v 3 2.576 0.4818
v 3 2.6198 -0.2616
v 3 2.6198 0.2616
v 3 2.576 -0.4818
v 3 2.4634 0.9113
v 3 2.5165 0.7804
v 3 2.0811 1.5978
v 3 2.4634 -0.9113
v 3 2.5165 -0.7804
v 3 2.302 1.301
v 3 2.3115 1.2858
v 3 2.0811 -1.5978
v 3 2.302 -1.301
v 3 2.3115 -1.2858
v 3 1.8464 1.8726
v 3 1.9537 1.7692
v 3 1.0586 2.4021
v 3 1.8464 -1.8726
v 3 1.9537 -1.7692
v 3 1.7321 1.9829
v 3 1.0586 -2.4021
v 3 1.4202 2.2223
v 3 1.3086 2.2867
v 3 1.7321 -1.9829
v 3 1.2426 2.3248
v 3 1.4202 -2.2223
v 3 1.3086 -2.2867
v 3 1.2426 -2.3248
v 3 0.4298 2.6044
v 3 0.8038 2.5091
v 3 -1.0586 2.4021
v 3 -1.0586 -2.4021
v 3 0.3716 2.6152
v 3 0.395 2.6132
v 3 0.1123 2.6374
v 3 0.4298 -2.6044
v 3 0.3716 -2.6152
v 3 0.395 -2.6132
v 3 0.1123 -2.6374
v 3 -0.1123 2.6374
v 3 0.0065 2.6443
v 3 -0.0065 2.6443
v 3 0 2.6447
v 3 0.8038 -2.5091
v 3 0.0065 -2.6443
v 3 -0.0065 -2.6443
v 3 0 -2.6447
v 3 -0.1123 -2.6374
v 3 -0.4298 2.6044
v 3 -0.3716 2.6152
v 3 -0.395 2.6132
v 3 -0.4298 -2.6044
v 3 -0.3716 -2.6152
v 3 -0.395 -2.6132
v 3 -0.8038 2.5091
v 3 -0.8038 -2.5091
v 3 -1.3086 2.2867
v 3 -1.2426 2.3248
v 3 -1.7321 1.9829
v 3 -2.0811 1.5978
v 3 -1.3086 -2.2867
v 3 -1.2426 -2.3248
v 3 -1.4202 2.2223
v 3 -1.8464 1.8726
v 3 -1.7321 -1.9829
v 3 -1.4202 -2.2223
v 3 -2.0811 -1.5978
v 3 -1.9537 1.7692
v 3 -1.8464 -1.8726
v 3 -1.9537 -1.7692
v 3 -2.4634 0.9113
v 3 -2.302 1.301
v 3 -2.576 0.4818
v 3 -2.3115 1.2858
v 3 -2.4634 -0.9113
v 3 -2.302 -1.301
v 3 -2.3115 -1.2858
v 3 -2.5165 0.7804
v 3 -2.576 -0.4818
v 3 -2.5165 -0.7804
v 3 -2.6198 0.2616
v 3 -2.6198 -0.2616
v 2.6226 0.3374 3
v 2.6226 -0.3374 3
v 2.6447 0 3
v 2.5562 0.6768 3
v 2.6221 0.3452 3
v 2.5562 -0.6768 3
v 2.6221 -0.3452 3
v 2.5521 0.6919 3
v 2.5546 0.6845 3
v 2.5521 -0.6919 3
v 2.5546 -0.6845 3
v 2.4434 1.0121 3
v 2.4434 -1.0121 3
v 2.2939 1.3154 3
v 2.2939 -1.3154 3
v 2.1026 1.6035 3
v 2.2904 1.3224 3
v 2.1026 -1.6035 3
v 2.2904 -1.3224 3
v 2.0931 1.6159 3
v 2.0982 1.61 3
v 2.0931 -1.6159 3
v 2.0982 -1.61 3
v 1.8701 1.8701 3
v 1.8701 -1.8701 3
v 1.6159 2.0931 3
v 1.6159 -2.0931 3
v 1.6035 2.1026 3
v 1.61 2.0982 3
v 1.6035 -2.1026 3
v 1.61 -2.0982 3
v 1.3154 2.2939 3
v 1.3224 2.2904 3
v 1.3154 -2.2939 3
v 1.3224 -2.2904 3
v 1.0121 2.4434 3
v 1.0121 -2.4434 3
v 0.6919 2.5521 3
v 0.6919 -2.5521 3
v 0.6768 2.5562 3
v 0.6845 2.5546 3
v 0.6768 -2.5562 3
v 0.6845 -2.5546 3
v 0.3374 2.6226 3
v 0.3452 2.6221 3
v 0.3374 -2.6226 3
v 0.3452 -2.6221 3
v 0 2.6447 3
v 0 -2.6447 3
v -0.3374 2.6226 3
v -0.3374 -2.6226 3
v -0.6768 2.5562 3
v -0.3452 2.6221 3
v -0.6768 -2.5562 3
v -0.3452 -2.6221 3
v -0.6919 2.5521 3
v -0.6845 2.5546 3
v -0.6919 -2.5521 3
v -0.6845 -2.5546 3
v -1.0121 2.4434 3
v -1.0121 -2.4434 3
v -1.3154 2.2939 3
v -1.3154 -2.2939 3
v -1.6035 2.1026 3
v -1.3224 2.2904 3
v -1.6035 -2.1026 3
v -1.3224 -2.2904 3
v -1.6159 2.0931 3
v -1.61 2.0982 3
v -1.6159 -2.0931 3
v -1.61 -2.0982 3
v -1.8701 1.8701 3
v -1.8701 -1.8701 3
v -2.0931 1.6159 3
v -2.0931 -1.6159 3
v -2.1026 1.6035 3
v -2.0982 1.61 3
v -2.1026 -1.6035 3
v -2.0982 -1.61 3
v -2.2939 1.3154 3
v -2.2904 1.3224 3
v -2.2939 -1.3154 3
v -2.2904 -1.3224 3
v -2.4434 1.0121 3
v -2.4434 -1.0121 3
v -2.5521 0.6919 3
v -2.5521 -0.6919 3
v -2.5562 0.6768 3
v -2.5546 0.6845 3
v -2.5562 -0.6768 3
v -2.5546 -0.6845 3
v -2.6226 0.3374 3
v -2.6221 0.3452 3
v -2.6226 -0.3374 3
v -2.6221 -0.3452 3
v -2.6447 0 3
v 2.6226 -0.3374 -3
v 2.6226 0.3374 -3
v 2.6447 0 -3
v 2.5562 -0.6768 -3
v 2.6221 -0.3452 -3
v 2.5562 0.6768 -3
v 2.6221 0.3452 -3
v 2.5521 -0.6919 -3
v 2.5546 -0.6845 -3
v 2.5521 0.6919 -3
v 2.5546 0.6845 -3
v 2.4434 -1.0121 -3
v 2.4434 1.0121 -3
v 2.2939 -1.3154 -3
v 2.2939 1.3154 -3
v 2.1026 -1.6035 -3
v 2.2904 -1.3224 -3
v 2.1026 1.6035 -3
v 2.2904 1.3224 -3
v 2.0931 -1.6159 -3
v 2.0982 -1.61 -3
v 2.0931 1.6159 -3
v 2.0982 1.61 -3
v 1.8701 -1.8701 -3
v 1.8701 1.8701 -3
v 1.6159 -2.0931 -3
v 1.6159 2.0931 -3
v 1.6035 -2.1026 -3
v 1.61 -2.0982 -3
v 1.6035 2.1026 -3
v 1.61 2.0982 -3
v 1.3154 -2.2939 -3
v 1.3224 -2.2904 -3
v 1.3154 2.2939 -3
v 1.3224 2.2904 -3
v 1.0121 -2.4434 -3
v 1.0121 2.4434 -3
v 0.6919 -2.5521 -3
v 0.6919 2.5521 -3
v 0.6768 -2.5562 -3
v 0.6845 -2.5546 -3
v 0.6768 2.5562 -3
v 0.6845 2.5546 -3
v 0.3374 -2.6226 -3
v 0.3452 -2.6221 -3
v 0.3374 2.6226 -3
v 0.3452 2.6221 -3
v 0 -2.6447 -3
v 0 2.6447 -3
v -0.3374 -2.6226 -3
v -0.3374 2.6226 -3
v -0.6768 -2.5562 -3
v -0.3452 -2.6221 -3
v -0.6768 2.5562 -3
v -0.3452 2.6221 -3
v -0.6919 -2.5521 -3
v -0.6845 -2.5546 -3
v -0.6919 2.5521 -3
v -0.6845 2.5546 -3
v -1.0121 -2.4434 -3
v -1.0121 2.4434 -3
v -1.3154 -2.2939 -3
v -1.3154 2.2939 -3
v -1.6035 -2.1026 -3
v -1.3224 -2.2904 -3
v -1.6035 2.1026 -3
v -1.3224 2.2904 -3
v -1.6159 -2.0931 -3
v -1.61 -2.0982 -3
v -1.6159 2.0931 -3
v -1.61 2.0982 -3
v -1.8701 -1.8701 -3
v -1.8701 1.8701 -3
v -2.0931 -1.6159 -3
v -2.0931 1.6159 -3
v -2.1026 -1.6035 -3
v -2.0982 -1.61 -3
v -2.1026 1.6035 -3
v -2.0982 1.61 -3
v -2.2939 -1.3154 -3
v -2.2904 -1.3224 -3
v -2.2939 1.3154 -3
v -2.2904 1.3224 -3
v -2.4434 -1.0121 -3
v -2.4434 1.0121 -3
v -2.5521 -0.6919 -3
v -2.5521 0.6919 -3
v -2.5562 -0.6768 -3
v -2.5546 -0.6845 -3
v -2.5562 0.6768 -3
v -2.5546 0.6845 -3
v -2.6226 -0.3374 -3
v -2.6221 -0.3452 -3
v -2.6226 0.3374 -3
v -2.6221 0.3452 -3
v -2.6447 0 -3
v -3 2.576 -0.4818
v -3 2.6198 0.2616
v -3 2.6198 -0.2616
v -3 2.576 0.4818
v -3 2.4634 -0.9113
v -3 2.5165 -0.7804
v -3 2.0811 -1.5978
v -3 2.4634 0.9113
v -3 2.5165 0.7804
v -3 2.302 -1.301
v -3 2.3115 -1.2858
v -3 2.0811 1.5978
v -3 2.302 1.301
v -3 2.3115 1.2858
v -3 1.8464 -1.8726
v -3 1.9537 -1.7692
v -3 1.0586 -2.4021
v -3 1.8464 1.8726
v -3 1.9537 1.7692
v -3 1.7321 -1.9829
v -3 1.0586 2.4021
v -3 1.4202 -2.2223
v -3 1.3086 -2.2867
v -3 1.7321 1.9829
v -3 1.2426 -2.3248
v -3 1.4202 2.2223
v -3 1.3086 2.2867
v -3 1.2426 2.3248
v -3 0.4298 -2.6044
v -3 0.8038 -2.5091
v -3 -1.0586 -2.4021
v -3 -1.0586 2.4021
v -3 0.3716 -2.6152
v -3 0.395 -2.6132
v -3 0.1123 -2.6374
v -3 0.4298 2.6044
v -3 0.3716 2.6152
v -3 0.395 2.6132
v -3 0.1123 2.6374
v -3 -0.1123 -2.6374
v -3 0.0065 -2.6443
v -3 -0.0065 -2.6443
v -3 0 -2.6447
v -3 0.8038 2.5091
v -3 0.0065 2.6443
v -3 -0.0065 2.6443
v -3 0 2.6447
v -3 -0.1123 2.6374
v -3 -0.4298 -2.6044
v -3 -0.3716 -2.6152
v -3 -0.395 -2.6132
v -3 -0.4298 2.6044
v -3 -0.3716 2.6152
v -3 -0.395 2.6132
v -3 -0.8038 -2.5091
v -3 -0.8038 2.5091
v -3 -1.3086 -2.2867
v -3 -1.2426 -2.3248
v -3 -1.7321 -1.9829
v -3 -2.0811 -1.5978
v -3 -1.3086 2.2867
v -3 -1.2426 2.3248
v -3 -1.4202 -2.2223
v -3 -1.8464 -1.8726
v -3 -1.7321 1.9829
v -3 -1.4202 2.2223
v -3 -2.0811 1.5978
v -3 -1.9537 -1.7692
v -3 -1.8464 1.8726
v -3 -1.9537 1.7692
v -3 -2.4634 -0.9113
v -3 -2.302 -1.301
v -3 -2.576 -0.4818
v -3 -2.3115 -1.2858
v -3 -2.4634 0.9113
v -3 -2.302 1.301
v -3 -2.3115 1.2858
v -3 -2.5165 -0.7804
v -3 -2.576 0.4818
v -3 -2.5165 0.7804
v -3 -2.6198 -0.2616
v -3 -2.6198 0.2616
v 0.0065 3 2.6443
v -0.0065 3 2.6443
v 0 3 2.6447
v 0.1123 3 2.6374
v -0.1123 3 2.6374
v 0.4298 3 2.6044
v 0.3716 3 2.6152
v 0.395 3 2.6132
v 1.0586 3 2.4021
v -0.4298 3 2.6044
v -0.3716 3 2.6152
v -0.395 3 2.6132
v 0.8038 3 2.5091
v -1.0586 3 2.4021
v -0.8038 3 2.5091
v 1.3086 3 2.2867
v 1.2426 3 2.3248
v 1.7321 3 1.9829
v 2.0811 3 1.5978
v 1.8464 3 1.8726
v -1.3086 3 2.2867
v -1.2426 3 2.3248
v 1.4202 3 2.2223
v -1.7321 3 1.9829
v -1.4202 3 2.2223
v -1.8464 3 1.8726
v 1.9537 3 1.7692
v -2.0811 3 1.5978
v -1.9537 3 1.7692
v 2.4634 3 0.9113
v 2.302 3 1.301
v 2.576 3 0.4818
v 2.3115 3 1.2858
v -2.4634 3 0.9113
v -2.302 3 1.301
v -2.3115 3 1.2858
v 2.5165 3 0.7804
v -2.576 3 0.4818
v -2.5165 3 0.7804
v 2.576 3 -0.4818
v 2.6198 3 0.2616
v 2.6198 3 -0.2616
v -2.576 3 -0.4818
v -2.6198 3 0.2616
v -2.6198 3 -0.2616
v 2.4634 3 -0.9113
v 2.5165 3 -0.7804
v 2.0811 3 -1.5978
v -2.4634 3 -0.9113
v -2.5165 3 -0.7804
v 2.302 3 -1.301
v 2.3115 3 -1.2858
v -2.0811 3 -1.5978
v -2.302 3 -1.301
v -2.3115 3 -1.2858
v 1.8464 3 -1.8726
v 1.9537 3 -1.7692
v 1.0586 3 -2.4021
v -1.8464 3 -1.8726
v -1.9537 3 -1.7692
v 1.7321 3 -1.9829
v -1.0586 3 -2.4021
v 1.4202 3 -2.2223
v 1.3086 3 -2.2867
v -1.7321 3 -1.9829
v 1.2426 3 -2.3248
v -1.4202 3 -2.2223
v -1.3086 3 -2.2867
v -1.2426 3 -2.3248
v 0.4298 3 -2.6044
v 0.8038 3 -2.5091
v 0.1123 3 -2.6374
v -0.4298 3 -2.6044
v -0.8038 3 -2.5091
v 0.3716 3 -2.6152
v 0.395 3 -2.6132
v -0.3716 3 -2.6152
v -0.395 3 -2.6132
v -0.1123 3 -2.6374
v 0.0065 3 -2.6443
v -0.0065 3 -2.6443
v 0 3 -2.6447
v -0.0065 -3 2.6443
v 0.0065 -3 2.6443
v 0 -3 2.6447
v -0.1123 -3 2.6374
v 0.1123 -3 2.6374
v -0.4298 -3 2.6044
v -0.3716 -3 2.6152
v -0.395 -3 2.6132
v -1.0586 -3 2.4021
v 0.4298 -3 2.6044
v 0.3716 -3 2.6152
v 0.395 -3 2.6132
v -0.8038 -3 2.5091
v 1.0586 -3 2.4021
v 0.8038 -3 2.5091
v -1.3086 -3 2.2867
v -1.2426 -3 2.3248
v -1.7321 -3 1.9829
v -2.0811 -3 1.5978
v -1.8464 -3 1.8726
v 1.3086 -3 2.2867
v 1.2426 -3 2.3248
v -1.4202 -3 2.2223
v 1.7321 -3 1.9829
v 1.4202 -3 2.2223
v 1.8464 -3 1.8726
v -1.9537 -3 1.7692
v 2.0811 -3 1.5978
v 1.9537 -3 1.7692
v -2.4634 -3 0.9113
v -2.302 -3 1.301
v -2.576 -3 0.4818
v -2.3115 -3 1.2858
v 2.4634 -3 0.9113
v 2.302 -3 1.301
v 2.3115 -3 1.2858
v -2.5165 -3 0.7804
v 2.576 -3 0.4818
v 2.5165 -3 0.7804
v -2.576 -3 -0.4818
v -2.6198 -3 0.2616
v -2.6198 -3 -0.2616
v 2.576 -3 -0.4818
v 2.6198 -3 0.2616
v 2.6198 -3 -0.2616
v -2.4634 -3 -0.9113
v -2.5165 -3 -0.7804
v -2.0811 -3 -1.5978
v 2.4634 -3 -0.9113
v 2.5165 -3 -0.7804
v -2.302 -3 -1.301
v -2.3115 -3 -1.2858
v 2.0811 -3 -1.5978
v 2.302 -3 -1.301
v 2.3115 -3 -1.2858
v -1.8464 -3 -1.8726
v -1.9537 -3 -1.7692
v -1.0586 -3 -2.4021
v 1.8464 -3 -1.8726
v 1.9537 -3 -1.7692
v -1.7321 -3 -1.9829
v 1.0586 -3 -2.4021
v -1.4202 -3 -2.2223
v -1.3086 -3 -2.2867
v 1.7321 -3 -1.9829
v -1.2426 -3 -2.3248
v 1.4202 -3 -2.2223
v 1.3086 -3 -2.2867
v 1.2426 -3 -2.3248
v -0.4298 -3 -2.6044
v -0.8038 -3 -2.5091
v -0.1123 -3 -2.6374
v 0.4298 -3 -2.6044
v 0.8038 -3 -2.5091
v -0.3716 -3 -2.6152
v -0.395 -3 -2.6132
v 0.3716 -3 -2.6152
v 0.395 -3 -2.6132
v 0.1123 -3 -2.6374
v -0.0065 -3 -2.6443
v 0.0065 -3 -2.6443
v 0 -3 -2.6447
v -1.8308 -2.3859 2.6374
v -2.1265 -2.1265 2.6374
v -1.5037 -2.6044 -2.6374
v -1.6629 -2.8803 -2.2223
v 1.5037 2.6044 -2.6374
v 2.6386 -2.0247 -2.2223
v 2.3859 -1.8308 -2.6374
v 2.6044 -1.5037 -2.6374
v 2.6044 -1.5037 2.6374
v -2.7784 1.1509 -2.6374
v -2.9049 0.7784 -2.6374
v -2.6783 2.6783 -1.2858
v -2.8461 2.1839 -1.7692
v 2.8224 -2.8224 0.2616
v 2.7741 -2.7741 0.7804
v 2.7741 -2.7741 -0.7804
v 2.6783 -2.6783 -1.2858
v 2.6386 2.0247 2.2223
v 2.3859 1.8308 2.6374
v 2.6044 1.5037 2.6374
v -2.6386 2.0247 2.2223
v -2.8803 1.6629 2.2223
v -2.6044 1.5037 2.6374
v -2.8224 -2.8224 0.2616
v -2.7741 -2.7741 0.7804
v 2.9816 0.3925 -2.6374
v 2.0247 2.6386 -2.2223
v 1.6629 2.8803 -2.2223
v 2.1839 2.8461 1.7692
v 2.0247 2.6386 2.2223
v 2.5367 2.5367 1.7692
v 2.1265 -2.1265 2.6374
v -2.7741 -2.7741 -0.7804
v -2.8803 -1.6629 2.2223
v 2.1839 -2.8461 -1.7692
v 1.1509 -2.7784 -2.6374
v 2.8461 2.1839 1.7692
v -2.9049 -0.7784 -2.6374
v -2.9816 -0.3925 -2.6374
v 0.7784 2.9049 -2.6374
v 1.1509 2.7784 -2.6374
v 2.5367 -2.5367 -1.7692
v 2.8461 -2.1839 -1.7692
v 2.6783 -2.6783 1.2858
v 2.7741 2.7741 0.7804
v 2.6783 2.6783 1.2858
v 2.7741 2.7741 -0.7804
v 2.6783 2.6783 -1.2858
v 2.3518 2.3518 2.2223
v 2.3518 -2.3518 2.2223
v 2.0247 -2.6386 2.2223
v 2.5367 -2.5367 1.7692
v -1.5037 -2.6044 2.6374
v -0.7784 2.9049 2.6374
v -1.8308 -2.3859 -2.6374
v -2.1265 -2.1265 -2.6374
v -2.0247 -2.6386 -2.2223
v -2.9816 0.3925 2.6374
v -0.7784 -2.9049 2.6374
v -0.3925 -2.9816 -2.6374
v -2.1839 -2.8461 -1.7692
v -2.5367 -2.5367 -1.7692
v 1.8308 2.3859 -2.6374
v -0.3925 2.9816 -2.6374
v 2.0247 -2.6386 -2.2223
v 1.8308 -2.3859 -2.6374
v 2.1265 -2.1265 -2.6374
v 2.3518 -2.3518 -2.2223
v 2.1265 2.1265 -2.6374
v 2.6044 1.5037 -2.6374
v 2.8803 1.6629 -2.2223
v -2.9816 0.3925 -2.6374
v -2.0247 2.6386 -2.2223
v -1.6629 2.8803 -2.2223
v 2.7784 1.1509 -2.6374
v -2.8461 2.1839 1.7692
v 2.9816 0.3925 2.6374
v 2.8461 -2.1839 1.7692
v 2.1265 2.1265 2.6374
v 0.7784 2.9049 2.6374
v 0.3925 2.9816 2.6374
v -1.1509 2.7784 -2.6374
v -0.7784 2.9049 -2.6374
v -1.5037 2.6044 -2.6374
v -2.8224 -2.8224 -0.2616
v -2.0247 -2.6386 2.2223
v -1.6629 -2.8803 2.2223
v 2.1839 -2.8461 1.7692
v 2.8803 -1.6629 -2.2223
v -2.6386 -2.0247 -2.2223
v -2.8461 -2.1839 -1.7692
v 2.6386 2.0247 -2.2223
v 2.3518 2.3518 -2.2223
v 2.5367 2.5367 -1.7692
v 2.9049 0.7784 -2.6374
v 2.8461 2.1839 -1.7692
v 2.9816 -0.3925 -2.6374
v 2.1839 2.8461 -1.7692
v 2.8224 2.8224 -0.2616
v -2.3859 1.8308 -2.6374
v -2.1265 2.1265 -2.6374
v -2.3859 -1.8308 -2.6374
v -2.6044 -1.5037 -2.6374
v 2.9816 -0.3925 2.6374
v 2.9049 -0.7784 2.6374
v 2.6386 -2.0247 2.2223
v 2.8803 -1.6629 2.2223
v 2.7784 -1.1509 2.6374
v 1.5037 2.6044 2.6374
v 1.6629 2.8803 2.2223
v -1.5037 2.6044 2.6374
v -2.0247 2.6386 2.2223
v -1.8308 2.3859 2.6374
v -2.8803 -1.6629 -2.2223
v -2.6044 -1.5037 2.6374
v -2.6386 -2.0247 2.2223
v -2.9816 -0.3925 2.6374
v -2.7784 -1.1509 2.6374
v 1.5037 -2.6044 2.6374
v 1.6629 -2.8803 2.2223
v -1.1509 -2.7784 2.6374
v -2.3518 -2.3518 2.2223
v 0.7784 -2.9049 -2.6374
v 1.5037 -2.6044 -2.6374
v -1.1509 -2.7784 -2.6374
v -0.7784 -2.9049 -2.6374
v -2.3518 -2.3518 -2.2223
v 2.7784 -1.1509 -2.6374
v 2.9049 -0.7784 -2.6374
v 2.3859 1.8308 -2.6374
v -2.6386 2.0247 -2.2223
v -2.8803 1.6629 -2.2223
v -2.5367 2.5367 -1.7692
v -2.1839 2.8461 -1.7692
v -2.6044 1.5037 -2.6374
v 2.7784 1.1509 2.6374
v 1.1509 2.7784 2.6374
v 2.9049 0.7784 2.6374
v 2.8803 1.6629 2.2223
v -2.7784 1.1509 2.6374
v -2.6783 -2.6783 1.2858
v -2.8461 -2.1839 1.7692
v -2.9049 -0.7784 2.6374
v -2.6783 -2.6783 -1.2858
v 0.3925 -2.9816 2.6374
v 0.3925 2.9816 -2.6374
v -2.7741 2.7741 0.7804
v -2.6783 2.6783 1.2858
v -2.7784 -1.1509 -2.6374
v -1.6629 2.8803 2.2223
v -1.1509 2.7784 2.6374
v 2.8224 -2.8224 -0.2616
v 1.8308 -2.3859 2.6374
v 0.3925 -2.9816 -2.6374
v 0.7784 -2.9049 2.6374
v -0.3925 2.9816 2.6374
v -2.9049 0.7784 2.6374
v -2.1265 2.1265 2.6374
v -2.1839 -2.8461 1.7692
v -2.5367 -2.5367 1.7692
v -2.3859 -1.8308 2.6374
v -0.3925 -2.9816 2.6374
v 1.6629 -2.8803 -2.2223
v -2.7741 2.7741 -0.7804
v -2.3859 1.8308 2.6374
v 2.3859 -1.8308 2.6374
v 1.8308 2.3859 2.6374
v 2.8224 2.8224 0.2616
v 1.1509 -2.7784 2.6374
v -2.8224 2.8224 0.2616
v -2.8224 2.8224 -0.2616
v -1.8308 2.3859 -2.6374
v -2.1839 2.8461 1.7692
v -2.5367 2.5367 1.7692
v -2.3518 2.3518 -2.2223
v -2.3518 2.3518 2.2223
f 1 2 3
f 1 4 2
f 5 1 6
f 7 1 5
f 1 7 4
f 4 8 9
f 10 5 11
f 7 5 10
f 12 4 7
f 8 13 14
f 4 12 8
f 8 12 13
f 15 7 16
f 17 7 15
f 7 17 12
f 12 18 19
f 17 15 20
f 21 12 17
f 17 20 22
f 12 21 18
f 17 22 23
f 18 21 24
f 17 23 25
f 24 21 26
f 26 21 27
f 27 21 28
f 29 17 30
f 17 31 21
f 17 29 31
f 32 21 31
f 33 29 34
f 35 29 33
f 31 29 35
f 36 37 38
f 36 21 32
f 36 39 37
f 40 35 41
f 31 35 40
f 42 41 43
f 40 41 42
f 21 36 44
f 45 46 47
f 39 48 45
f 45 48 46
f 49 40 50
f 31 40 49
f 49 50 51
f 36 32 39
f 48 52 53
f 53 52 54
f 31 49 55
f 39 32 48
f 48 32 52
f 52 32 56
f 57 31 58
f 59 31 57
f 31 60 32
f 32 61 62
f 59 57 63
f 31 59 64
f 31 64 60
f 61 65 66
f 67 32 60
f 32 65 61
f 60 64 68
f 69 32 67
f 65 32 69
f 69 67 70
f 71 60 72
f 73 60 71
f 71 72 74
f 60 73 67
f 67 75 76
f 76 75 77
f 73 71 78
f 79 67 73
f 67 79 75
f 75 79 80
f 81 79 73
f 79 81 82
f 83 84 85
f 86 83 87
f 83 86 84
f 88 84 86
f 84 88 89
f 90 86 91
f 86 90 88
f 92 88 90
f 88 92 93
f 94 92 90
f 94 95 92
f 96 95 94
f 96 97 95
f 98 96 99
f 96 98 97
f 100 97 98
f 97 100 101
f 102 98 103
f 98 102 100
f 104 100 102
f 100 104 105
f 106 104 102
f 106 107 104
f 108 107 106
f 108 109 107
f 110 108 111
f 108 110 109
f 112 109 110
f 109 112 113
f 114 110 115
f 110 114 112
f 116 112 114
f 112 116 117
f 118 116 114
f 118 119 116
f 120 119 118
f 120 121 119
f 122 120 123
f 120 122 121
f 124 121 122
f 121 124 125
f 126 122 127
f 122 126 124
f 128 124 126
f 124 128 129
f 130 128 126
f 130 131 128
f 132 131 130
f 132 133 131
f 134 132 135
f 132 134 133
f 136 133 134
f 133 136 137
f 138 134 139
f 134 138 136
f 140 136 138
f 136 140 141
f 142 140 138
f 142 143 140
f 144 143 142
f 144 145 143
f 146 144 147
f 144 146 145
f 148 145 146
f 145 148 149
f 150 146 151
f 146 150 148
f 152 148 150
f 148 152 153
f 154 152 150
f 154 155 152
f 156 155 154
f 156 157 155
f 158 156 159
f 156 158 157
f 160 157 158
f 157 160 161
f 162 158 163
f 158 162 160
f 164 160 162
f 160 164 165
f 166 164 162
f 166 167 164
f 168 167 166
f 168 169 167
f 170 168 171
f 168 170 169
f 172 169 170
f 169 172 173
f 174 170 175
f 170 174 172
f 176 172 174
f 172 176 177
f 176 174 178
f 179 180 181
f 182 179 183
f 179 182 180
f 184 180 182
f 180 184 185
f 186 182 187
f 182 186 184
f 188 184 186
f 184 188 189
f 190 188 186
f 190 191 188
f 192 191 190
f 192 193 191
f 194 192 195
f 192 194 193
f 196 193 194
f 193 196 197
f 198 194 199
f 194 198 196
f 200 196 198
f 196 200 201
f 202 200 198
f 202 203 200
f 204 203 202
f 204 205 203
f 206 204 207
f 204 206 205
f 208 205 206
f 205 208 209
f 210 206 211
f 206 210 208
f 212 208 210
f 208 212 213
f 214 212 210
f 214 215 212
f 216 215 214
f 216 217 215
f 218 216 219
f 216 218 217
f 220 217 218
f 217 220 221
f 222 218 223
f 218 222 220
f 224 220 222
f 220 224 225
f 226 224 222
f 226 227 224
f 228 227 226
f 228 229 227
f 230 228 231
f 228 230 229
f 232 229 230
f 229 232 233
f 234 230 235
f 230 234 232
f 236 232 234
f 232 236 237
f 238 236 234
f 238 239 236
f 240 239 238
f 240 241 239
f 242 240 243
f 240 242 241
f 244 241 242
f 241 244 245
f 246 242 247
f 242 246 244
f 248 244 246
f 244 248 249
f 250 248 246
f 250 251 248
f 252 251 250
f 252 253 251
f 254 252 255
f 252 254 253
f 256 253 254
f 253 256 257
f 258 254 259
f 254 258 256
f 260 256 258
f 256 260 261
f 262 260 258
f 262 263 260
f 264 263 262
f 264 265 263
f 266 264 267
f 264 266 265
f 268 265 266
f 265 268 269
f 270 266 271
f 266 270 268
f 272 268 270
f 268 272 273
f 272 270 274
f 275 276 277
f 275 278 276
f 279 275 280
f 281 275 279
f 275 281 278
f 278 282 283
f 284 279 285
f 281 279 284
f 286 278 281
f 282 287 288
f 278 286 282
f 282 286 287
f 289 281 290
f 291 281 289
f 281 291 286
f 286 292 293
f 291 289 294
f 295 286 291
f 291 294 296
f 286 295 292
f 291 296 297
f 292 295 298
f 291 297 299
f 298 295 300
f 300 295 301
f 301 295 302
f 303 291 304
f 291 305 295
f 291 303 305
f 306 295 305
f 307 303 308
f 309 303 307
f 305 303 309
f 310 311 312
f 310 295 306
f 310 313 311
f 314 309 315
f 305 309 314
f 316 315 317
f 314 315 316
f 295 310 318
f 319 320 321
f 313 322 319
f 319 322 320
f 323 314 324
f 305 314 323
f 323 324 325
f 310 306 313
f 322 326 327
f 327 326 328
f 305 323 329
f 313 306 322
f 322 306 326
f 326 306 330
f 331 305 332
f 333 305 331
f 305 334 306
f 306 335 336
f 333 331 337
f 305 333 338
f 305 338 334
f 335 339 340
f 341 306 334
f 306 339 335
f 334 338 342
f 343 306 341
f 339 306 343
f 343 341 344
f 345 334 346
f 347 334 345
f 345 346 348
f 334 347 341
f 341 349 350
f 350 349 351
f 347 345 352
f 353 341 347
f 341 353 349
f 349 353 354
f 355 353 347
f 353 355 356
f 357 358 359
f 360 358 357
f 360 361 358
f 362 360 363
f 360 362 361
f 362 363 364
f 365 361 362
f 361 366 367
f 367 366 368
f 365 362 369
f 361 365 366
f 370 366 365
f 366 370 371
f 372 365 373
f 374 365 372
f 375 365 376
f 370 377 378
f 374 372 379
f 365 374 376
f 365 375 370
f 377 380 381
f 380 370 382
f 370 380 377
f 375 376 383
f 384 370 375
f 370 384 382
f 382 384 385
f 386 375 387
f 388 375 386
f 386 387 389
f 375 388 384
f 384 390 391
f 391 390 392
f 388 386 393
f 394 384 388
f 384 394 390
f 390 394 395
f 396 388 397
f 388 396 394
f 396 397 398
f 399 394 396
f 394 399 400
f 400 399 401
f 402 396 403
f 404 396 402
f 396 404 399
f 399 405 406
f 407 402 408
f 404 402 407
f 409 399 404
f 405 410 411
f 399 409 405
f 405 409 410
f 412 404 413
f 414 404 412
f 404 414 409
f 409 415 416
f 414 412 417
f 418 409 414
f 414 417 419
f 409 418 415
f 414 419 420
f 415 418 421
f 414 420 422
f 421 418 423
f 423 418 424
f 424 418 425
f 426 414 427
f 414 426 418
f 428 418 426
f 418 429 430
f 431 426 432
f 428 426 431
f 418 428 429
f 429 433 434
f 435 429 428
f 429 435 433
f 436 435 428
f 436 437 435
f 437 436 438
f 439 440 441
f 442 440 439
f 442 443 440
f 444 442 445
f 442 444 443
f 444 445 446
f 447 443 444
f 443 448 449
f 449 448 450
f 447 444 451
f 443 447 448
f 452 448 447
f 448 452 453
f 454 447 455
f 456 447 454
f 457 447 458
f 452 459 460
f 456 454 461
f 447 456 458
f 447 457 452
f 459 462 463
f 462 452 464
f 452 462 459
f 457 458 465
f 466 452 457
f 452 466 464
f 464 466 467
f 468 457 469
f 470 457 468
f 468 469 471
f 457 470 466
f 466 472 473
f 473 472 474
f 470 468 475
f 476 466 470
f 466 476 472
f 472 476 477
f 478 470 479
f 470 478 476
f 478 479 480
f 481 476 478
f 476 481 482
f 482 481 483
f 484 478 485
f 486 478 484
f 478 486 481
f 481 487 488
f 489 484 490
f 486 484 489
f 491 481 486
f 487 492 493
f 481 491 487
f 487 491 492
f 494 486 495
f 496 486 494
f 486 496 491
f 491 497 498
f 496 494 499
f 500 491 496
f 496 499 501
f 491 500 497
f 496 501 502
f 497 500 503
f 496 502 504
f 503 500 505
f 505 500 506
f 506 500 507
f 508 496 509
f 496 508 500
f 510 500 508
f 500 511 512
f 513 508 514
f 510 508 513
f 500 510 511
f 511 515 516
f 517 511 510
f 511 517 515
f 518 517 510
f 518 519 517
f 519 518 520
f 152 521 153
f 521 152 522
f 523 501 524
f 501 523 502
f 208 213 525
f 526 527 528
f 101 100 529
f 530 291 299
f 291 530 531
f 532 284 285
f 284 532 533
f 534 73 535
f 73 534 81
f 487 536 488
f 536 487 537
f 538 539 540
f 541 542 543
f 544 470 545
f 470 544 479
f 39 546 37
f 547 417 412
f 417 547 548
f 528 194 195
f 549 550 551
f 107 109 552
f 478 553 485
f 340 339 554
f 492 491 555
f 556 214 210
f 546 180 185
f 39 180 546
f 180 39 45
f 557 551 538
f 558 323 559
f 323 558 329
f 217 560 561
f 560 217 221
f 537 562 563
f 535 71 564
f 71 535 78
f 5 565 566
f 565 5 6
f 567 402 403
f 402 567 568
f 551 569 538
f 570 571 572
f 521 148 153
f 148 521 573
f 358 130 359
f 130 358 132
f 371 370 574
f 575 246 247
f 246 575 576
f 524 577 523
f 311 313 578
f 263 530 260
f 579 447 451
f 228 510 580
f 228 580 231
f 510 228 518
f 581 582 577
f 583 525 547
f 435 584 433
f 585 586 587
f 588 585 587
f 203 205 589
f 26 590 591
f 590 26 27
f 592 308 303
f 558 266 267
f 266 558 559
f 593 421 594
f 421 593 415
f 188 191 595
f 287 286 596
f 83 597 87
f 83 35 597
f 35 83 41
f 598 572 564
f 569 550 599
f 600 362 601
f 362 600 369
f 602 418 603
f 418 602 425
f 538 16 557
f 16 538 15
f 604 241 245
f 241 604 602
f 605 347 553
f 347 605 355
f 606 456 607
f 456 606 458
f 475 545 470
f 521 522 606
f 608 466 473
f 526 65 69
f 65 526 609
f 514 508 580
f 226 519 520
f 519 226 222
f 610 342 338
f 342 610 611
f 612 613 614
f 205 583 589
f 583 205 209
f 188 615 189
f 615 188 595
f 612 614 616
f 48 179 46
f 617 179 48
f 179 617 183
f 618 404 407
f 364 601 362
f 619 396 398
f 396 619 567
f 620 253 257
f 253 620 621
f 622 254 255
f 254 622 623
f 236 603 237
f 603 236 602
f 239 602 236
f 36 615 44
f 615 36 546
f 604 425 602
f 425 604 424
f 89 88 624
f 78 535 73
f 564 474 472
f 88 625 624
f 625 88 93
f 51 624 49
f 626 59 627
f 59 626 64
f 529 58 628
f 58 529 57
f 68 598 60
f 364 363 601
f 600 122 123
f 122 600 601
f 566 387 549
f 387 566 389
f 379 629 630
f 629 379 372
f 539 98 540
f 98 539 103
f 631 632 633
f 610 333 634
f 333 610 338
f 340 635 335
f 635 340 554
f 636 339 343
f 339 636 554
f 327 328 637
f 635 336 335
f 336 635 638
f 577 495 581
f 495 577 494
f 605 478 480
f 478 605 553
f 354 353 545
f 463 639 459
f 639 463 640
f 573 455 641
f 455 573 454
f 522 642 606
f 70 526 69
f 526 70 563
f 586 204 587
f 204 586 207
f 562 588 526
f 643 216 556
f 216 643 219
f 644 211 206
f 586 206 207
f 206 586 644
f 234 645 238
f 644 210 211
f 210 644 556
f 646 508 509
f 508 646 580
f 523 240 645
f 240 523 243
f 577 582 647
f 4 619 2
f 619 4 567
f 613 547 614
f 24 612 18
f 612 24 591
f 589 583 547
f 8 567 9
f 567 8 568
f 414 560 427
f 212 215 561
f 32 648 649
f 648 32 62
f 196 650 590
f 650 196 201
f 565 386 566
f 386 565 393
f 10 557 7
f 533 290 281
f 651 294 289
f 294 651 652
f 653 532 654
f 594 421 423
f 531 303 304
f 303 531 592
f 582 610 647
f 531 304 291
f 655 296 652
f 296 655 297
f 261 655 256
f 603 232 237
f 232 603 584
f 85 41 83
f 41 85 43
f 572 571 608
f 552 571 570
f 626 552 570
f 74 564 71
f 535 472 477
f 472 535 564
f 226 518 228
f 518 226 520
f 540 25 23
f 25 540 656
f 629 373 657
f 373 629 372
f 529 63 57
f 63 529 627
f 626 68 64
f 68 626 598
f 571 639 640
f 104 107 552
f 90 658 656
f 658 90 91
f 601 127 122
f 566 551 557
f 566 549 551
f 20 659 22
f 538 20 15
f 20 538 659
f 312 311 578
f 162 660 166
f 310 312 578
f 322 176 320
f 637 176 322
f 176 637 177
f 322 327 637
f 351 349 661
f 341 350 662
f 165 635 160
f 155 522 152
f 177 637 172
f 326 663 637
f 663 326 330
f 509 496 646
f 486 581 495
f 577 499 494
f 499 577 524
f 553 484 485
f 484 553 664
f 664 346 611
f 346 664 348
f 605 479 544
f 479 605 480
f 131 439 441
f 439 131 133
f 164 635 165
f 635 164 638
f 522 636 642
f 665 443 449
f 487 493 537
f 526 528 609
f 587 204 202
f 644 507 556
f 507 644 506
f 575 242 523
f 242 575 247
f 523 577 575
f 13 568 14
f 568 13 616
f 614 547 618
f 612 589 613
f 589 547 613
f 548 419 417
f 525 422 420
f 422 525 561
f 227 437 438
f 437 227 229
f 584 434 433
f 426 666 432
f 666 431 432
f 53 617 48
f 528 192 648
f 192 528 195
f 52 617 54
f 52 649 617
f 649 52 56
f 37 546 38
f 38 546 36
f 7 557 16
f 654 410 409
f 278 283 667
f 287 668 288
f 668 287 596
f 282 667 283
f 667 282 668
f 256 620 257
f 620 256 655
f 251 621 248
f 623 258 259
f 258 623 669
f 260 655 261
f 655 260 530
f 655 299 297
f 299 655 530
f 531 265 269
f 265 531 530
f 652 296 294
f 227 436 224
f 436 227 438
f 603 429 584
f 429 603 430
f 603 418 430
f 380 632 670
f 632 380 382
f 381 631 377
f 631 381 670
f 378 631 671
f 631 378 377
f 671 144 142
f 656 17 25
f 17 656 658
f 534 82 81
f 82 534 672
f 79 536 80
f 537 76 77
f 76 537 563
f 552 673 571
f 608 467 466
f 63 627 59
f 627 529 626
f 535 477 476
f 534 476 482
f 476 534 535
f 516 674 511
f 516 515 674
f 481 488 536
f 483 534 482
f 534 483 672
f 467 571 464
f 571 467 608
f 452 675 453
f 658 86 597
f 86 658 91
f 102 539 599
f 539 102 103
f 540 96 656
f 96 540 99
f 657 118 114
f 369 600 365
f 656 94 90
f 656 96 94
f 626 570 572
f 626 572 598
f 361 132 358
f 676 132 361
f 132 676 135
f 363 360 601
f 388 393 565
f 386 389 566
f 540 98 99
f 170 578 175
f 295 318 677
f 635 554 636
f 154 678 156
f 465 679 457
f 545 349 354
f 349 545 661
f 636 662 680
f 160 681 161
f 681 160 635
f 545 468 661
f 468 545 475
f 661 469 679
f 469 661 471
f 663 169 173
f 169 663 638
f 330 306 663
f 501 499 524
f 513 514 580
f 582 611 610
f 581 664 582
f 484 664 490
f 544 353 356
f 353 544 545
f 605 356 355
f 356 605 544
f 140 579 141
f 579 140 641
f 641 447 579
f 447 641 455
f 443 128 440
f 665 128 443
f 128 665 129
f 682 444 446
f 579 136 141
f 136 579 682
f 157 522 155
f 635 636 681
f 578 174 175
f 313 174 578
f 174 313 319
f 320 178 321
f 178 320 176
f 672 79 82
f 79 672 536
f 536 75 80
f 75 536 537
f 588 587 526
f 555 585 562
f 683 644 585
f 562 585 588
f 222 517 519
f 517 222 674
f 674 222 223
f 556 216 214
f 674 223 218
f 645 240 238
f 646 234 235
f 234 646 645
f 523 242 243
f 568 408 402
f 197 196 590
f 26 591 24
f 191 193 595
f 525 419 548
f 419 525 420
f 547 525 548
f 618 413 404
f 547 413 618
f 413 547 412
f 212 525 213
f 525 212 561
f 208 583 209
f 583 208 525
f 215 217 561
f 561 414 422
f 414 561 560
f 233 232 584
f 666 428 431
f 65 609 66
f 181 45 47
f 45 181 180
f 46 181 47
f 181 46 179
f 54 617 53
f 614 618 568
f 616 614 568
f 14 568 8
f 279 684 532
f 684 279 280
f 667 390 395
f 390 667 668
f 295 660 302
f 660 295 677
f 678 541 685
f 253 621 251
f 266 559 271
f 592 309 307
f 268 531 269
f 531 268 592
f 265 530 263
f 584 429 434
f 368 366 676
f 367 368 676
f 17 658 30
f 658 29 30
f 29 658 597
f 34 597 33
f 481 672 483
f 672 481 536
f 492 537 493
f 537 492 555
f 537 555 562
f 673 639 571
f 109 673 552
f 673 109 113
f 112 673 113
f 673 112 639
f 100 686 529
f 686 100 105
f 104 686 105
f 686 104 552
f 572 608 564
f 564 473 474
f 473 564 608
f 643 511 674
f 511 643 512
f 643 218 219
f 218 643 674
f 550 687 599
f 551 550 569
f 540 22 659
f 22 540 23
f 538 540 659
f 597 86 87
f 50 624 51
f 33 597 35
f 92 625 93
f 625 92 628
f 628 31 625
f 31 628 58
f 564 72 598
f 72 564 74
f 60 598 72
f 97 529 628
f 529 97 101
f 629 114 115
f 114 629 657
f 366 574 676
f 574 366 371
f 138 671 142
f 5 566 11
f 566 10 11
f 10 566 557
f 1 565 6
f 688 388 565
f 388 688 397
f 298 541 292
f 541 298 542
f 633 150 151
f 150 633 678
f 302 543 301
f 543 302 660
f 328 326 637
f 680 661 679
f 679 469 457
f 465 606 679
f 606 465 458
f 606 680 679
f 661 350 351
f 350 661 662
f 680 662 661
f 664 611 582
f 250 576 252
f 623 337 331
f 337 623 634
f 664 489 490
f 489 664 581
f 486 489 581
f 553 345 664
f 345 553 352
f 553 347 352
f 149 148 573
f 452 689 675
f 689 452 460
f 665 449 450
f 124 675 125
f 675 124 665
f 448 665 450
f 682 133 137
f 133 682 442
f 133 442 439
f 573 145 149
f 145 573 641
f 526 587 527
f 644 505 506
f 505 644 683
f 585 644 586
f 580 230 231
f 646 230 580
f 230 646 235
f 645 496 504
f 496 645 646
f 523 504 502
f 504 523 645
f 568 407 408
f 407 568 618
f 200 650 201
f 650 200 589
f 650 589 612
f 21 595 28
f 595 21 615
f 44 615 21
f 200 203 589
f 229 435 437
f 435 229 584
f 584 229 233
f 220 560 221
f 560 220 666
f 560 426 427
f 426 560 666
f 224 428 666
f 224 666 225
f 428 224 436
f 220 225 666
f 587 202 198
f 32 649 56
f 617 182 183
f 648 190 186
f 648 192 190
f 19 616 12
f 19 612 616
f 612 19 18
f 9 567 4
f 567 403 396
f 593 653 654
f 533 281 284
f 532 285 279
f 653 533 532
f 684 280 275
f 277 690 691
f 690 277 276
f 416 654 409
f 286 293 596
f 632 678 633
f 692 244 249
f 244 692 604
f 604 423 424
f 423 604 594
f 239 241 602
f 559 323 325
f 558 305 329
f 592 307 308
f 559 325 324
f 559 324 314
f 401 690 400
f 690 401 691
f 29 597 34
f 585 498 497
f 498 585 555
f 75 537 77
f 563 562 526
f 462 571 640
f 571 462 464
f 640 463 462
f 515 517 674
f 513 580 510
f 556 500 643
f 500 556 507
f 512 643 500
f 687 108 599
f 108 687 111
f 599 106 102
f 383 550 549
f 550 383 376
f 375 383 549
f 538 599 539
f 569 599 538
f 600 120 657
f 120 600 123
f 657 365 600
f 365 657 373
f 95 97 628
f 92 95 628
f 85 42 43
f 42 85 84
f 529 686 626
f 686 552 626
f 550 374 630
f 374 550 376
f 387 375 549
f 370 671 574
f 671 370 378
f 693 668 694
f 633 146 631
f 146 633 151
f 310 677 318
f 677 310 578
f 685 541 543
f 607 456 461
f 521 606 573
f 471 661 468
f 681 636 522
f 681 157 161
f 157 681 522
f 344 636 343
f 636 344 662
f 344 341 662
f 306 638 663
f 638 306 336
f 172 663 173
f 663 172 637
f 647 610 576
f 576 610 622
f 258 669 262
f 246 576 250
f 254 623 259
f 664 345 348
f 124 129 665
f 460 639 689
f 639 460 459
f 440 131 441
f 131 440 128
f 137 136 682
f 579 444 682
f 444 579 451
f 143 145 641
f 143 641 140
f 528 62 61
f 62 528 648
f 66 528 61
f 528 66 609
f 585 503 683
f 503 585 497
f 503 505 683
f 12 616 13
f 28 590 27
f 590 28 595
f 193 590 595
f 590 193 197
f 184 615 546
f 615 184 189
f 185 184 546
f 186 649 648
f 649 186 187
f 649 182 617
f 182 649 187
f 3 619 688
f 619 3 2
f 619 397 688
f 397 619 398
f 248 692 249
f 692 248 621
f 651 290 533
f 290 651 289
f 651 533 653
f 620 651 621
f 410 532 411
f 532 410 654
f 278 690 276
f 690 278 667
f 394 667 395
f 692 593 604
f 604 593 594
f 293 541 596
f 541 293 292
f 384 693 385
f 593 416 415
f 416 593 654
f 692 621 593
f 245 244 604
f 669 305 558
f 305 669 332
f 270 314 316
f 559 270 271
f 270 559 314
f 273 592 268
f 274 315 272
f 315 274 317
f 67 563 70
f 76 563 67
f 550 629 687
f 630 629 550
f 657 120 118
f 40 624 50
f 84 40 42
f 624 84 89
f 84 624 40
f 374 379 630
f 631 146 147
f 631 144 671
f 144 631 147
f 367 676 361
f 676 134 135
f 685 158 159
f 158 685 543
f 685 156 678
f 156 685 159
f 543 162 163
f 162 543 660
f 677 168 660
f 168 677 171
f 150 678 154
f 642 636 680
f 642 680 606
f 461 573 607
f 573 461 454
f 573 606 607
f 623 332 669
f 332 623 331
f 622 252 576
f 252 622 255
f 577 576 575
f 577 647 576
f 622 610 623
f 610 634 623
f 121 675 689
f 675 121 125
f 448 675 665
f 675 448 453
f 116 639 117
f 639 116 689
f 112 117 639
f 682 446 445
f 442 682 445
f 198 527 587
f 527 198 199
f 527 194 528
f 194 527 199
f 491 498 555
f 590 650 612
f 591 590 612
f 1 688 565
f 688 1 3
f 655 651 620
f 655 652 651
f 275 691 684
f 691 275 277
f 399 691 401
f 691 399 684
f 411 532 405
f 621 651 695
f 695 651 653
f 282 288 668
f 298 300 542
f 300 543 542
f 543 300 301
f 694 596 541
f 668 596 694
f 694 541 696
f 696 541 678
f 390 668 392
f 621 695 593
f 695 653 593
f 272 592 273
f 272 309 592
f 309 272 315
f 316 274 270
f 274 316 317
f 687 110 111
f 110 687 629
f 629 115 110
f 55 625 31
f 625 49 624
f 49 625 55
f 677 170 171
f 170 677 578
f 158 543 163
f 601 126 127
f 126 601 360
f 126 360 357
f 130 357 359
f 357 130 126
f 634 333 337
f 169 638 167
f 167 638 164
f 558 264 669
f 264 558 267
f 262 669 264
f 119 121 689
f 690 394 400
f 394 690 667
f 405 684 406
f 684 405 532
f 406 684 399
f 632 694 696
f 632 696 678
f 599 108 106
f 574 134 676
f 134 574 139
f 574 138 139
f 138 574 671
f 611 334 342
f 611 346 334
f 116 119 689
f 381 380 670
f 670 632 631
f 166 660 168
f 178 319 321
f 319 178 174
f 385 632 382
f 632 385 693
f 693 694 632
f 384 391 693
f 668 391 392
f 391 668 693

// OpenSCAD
intersection() {
    cube([6, 6, 6], center = true);
    sphere(r = 4, $fn = 48);
}
